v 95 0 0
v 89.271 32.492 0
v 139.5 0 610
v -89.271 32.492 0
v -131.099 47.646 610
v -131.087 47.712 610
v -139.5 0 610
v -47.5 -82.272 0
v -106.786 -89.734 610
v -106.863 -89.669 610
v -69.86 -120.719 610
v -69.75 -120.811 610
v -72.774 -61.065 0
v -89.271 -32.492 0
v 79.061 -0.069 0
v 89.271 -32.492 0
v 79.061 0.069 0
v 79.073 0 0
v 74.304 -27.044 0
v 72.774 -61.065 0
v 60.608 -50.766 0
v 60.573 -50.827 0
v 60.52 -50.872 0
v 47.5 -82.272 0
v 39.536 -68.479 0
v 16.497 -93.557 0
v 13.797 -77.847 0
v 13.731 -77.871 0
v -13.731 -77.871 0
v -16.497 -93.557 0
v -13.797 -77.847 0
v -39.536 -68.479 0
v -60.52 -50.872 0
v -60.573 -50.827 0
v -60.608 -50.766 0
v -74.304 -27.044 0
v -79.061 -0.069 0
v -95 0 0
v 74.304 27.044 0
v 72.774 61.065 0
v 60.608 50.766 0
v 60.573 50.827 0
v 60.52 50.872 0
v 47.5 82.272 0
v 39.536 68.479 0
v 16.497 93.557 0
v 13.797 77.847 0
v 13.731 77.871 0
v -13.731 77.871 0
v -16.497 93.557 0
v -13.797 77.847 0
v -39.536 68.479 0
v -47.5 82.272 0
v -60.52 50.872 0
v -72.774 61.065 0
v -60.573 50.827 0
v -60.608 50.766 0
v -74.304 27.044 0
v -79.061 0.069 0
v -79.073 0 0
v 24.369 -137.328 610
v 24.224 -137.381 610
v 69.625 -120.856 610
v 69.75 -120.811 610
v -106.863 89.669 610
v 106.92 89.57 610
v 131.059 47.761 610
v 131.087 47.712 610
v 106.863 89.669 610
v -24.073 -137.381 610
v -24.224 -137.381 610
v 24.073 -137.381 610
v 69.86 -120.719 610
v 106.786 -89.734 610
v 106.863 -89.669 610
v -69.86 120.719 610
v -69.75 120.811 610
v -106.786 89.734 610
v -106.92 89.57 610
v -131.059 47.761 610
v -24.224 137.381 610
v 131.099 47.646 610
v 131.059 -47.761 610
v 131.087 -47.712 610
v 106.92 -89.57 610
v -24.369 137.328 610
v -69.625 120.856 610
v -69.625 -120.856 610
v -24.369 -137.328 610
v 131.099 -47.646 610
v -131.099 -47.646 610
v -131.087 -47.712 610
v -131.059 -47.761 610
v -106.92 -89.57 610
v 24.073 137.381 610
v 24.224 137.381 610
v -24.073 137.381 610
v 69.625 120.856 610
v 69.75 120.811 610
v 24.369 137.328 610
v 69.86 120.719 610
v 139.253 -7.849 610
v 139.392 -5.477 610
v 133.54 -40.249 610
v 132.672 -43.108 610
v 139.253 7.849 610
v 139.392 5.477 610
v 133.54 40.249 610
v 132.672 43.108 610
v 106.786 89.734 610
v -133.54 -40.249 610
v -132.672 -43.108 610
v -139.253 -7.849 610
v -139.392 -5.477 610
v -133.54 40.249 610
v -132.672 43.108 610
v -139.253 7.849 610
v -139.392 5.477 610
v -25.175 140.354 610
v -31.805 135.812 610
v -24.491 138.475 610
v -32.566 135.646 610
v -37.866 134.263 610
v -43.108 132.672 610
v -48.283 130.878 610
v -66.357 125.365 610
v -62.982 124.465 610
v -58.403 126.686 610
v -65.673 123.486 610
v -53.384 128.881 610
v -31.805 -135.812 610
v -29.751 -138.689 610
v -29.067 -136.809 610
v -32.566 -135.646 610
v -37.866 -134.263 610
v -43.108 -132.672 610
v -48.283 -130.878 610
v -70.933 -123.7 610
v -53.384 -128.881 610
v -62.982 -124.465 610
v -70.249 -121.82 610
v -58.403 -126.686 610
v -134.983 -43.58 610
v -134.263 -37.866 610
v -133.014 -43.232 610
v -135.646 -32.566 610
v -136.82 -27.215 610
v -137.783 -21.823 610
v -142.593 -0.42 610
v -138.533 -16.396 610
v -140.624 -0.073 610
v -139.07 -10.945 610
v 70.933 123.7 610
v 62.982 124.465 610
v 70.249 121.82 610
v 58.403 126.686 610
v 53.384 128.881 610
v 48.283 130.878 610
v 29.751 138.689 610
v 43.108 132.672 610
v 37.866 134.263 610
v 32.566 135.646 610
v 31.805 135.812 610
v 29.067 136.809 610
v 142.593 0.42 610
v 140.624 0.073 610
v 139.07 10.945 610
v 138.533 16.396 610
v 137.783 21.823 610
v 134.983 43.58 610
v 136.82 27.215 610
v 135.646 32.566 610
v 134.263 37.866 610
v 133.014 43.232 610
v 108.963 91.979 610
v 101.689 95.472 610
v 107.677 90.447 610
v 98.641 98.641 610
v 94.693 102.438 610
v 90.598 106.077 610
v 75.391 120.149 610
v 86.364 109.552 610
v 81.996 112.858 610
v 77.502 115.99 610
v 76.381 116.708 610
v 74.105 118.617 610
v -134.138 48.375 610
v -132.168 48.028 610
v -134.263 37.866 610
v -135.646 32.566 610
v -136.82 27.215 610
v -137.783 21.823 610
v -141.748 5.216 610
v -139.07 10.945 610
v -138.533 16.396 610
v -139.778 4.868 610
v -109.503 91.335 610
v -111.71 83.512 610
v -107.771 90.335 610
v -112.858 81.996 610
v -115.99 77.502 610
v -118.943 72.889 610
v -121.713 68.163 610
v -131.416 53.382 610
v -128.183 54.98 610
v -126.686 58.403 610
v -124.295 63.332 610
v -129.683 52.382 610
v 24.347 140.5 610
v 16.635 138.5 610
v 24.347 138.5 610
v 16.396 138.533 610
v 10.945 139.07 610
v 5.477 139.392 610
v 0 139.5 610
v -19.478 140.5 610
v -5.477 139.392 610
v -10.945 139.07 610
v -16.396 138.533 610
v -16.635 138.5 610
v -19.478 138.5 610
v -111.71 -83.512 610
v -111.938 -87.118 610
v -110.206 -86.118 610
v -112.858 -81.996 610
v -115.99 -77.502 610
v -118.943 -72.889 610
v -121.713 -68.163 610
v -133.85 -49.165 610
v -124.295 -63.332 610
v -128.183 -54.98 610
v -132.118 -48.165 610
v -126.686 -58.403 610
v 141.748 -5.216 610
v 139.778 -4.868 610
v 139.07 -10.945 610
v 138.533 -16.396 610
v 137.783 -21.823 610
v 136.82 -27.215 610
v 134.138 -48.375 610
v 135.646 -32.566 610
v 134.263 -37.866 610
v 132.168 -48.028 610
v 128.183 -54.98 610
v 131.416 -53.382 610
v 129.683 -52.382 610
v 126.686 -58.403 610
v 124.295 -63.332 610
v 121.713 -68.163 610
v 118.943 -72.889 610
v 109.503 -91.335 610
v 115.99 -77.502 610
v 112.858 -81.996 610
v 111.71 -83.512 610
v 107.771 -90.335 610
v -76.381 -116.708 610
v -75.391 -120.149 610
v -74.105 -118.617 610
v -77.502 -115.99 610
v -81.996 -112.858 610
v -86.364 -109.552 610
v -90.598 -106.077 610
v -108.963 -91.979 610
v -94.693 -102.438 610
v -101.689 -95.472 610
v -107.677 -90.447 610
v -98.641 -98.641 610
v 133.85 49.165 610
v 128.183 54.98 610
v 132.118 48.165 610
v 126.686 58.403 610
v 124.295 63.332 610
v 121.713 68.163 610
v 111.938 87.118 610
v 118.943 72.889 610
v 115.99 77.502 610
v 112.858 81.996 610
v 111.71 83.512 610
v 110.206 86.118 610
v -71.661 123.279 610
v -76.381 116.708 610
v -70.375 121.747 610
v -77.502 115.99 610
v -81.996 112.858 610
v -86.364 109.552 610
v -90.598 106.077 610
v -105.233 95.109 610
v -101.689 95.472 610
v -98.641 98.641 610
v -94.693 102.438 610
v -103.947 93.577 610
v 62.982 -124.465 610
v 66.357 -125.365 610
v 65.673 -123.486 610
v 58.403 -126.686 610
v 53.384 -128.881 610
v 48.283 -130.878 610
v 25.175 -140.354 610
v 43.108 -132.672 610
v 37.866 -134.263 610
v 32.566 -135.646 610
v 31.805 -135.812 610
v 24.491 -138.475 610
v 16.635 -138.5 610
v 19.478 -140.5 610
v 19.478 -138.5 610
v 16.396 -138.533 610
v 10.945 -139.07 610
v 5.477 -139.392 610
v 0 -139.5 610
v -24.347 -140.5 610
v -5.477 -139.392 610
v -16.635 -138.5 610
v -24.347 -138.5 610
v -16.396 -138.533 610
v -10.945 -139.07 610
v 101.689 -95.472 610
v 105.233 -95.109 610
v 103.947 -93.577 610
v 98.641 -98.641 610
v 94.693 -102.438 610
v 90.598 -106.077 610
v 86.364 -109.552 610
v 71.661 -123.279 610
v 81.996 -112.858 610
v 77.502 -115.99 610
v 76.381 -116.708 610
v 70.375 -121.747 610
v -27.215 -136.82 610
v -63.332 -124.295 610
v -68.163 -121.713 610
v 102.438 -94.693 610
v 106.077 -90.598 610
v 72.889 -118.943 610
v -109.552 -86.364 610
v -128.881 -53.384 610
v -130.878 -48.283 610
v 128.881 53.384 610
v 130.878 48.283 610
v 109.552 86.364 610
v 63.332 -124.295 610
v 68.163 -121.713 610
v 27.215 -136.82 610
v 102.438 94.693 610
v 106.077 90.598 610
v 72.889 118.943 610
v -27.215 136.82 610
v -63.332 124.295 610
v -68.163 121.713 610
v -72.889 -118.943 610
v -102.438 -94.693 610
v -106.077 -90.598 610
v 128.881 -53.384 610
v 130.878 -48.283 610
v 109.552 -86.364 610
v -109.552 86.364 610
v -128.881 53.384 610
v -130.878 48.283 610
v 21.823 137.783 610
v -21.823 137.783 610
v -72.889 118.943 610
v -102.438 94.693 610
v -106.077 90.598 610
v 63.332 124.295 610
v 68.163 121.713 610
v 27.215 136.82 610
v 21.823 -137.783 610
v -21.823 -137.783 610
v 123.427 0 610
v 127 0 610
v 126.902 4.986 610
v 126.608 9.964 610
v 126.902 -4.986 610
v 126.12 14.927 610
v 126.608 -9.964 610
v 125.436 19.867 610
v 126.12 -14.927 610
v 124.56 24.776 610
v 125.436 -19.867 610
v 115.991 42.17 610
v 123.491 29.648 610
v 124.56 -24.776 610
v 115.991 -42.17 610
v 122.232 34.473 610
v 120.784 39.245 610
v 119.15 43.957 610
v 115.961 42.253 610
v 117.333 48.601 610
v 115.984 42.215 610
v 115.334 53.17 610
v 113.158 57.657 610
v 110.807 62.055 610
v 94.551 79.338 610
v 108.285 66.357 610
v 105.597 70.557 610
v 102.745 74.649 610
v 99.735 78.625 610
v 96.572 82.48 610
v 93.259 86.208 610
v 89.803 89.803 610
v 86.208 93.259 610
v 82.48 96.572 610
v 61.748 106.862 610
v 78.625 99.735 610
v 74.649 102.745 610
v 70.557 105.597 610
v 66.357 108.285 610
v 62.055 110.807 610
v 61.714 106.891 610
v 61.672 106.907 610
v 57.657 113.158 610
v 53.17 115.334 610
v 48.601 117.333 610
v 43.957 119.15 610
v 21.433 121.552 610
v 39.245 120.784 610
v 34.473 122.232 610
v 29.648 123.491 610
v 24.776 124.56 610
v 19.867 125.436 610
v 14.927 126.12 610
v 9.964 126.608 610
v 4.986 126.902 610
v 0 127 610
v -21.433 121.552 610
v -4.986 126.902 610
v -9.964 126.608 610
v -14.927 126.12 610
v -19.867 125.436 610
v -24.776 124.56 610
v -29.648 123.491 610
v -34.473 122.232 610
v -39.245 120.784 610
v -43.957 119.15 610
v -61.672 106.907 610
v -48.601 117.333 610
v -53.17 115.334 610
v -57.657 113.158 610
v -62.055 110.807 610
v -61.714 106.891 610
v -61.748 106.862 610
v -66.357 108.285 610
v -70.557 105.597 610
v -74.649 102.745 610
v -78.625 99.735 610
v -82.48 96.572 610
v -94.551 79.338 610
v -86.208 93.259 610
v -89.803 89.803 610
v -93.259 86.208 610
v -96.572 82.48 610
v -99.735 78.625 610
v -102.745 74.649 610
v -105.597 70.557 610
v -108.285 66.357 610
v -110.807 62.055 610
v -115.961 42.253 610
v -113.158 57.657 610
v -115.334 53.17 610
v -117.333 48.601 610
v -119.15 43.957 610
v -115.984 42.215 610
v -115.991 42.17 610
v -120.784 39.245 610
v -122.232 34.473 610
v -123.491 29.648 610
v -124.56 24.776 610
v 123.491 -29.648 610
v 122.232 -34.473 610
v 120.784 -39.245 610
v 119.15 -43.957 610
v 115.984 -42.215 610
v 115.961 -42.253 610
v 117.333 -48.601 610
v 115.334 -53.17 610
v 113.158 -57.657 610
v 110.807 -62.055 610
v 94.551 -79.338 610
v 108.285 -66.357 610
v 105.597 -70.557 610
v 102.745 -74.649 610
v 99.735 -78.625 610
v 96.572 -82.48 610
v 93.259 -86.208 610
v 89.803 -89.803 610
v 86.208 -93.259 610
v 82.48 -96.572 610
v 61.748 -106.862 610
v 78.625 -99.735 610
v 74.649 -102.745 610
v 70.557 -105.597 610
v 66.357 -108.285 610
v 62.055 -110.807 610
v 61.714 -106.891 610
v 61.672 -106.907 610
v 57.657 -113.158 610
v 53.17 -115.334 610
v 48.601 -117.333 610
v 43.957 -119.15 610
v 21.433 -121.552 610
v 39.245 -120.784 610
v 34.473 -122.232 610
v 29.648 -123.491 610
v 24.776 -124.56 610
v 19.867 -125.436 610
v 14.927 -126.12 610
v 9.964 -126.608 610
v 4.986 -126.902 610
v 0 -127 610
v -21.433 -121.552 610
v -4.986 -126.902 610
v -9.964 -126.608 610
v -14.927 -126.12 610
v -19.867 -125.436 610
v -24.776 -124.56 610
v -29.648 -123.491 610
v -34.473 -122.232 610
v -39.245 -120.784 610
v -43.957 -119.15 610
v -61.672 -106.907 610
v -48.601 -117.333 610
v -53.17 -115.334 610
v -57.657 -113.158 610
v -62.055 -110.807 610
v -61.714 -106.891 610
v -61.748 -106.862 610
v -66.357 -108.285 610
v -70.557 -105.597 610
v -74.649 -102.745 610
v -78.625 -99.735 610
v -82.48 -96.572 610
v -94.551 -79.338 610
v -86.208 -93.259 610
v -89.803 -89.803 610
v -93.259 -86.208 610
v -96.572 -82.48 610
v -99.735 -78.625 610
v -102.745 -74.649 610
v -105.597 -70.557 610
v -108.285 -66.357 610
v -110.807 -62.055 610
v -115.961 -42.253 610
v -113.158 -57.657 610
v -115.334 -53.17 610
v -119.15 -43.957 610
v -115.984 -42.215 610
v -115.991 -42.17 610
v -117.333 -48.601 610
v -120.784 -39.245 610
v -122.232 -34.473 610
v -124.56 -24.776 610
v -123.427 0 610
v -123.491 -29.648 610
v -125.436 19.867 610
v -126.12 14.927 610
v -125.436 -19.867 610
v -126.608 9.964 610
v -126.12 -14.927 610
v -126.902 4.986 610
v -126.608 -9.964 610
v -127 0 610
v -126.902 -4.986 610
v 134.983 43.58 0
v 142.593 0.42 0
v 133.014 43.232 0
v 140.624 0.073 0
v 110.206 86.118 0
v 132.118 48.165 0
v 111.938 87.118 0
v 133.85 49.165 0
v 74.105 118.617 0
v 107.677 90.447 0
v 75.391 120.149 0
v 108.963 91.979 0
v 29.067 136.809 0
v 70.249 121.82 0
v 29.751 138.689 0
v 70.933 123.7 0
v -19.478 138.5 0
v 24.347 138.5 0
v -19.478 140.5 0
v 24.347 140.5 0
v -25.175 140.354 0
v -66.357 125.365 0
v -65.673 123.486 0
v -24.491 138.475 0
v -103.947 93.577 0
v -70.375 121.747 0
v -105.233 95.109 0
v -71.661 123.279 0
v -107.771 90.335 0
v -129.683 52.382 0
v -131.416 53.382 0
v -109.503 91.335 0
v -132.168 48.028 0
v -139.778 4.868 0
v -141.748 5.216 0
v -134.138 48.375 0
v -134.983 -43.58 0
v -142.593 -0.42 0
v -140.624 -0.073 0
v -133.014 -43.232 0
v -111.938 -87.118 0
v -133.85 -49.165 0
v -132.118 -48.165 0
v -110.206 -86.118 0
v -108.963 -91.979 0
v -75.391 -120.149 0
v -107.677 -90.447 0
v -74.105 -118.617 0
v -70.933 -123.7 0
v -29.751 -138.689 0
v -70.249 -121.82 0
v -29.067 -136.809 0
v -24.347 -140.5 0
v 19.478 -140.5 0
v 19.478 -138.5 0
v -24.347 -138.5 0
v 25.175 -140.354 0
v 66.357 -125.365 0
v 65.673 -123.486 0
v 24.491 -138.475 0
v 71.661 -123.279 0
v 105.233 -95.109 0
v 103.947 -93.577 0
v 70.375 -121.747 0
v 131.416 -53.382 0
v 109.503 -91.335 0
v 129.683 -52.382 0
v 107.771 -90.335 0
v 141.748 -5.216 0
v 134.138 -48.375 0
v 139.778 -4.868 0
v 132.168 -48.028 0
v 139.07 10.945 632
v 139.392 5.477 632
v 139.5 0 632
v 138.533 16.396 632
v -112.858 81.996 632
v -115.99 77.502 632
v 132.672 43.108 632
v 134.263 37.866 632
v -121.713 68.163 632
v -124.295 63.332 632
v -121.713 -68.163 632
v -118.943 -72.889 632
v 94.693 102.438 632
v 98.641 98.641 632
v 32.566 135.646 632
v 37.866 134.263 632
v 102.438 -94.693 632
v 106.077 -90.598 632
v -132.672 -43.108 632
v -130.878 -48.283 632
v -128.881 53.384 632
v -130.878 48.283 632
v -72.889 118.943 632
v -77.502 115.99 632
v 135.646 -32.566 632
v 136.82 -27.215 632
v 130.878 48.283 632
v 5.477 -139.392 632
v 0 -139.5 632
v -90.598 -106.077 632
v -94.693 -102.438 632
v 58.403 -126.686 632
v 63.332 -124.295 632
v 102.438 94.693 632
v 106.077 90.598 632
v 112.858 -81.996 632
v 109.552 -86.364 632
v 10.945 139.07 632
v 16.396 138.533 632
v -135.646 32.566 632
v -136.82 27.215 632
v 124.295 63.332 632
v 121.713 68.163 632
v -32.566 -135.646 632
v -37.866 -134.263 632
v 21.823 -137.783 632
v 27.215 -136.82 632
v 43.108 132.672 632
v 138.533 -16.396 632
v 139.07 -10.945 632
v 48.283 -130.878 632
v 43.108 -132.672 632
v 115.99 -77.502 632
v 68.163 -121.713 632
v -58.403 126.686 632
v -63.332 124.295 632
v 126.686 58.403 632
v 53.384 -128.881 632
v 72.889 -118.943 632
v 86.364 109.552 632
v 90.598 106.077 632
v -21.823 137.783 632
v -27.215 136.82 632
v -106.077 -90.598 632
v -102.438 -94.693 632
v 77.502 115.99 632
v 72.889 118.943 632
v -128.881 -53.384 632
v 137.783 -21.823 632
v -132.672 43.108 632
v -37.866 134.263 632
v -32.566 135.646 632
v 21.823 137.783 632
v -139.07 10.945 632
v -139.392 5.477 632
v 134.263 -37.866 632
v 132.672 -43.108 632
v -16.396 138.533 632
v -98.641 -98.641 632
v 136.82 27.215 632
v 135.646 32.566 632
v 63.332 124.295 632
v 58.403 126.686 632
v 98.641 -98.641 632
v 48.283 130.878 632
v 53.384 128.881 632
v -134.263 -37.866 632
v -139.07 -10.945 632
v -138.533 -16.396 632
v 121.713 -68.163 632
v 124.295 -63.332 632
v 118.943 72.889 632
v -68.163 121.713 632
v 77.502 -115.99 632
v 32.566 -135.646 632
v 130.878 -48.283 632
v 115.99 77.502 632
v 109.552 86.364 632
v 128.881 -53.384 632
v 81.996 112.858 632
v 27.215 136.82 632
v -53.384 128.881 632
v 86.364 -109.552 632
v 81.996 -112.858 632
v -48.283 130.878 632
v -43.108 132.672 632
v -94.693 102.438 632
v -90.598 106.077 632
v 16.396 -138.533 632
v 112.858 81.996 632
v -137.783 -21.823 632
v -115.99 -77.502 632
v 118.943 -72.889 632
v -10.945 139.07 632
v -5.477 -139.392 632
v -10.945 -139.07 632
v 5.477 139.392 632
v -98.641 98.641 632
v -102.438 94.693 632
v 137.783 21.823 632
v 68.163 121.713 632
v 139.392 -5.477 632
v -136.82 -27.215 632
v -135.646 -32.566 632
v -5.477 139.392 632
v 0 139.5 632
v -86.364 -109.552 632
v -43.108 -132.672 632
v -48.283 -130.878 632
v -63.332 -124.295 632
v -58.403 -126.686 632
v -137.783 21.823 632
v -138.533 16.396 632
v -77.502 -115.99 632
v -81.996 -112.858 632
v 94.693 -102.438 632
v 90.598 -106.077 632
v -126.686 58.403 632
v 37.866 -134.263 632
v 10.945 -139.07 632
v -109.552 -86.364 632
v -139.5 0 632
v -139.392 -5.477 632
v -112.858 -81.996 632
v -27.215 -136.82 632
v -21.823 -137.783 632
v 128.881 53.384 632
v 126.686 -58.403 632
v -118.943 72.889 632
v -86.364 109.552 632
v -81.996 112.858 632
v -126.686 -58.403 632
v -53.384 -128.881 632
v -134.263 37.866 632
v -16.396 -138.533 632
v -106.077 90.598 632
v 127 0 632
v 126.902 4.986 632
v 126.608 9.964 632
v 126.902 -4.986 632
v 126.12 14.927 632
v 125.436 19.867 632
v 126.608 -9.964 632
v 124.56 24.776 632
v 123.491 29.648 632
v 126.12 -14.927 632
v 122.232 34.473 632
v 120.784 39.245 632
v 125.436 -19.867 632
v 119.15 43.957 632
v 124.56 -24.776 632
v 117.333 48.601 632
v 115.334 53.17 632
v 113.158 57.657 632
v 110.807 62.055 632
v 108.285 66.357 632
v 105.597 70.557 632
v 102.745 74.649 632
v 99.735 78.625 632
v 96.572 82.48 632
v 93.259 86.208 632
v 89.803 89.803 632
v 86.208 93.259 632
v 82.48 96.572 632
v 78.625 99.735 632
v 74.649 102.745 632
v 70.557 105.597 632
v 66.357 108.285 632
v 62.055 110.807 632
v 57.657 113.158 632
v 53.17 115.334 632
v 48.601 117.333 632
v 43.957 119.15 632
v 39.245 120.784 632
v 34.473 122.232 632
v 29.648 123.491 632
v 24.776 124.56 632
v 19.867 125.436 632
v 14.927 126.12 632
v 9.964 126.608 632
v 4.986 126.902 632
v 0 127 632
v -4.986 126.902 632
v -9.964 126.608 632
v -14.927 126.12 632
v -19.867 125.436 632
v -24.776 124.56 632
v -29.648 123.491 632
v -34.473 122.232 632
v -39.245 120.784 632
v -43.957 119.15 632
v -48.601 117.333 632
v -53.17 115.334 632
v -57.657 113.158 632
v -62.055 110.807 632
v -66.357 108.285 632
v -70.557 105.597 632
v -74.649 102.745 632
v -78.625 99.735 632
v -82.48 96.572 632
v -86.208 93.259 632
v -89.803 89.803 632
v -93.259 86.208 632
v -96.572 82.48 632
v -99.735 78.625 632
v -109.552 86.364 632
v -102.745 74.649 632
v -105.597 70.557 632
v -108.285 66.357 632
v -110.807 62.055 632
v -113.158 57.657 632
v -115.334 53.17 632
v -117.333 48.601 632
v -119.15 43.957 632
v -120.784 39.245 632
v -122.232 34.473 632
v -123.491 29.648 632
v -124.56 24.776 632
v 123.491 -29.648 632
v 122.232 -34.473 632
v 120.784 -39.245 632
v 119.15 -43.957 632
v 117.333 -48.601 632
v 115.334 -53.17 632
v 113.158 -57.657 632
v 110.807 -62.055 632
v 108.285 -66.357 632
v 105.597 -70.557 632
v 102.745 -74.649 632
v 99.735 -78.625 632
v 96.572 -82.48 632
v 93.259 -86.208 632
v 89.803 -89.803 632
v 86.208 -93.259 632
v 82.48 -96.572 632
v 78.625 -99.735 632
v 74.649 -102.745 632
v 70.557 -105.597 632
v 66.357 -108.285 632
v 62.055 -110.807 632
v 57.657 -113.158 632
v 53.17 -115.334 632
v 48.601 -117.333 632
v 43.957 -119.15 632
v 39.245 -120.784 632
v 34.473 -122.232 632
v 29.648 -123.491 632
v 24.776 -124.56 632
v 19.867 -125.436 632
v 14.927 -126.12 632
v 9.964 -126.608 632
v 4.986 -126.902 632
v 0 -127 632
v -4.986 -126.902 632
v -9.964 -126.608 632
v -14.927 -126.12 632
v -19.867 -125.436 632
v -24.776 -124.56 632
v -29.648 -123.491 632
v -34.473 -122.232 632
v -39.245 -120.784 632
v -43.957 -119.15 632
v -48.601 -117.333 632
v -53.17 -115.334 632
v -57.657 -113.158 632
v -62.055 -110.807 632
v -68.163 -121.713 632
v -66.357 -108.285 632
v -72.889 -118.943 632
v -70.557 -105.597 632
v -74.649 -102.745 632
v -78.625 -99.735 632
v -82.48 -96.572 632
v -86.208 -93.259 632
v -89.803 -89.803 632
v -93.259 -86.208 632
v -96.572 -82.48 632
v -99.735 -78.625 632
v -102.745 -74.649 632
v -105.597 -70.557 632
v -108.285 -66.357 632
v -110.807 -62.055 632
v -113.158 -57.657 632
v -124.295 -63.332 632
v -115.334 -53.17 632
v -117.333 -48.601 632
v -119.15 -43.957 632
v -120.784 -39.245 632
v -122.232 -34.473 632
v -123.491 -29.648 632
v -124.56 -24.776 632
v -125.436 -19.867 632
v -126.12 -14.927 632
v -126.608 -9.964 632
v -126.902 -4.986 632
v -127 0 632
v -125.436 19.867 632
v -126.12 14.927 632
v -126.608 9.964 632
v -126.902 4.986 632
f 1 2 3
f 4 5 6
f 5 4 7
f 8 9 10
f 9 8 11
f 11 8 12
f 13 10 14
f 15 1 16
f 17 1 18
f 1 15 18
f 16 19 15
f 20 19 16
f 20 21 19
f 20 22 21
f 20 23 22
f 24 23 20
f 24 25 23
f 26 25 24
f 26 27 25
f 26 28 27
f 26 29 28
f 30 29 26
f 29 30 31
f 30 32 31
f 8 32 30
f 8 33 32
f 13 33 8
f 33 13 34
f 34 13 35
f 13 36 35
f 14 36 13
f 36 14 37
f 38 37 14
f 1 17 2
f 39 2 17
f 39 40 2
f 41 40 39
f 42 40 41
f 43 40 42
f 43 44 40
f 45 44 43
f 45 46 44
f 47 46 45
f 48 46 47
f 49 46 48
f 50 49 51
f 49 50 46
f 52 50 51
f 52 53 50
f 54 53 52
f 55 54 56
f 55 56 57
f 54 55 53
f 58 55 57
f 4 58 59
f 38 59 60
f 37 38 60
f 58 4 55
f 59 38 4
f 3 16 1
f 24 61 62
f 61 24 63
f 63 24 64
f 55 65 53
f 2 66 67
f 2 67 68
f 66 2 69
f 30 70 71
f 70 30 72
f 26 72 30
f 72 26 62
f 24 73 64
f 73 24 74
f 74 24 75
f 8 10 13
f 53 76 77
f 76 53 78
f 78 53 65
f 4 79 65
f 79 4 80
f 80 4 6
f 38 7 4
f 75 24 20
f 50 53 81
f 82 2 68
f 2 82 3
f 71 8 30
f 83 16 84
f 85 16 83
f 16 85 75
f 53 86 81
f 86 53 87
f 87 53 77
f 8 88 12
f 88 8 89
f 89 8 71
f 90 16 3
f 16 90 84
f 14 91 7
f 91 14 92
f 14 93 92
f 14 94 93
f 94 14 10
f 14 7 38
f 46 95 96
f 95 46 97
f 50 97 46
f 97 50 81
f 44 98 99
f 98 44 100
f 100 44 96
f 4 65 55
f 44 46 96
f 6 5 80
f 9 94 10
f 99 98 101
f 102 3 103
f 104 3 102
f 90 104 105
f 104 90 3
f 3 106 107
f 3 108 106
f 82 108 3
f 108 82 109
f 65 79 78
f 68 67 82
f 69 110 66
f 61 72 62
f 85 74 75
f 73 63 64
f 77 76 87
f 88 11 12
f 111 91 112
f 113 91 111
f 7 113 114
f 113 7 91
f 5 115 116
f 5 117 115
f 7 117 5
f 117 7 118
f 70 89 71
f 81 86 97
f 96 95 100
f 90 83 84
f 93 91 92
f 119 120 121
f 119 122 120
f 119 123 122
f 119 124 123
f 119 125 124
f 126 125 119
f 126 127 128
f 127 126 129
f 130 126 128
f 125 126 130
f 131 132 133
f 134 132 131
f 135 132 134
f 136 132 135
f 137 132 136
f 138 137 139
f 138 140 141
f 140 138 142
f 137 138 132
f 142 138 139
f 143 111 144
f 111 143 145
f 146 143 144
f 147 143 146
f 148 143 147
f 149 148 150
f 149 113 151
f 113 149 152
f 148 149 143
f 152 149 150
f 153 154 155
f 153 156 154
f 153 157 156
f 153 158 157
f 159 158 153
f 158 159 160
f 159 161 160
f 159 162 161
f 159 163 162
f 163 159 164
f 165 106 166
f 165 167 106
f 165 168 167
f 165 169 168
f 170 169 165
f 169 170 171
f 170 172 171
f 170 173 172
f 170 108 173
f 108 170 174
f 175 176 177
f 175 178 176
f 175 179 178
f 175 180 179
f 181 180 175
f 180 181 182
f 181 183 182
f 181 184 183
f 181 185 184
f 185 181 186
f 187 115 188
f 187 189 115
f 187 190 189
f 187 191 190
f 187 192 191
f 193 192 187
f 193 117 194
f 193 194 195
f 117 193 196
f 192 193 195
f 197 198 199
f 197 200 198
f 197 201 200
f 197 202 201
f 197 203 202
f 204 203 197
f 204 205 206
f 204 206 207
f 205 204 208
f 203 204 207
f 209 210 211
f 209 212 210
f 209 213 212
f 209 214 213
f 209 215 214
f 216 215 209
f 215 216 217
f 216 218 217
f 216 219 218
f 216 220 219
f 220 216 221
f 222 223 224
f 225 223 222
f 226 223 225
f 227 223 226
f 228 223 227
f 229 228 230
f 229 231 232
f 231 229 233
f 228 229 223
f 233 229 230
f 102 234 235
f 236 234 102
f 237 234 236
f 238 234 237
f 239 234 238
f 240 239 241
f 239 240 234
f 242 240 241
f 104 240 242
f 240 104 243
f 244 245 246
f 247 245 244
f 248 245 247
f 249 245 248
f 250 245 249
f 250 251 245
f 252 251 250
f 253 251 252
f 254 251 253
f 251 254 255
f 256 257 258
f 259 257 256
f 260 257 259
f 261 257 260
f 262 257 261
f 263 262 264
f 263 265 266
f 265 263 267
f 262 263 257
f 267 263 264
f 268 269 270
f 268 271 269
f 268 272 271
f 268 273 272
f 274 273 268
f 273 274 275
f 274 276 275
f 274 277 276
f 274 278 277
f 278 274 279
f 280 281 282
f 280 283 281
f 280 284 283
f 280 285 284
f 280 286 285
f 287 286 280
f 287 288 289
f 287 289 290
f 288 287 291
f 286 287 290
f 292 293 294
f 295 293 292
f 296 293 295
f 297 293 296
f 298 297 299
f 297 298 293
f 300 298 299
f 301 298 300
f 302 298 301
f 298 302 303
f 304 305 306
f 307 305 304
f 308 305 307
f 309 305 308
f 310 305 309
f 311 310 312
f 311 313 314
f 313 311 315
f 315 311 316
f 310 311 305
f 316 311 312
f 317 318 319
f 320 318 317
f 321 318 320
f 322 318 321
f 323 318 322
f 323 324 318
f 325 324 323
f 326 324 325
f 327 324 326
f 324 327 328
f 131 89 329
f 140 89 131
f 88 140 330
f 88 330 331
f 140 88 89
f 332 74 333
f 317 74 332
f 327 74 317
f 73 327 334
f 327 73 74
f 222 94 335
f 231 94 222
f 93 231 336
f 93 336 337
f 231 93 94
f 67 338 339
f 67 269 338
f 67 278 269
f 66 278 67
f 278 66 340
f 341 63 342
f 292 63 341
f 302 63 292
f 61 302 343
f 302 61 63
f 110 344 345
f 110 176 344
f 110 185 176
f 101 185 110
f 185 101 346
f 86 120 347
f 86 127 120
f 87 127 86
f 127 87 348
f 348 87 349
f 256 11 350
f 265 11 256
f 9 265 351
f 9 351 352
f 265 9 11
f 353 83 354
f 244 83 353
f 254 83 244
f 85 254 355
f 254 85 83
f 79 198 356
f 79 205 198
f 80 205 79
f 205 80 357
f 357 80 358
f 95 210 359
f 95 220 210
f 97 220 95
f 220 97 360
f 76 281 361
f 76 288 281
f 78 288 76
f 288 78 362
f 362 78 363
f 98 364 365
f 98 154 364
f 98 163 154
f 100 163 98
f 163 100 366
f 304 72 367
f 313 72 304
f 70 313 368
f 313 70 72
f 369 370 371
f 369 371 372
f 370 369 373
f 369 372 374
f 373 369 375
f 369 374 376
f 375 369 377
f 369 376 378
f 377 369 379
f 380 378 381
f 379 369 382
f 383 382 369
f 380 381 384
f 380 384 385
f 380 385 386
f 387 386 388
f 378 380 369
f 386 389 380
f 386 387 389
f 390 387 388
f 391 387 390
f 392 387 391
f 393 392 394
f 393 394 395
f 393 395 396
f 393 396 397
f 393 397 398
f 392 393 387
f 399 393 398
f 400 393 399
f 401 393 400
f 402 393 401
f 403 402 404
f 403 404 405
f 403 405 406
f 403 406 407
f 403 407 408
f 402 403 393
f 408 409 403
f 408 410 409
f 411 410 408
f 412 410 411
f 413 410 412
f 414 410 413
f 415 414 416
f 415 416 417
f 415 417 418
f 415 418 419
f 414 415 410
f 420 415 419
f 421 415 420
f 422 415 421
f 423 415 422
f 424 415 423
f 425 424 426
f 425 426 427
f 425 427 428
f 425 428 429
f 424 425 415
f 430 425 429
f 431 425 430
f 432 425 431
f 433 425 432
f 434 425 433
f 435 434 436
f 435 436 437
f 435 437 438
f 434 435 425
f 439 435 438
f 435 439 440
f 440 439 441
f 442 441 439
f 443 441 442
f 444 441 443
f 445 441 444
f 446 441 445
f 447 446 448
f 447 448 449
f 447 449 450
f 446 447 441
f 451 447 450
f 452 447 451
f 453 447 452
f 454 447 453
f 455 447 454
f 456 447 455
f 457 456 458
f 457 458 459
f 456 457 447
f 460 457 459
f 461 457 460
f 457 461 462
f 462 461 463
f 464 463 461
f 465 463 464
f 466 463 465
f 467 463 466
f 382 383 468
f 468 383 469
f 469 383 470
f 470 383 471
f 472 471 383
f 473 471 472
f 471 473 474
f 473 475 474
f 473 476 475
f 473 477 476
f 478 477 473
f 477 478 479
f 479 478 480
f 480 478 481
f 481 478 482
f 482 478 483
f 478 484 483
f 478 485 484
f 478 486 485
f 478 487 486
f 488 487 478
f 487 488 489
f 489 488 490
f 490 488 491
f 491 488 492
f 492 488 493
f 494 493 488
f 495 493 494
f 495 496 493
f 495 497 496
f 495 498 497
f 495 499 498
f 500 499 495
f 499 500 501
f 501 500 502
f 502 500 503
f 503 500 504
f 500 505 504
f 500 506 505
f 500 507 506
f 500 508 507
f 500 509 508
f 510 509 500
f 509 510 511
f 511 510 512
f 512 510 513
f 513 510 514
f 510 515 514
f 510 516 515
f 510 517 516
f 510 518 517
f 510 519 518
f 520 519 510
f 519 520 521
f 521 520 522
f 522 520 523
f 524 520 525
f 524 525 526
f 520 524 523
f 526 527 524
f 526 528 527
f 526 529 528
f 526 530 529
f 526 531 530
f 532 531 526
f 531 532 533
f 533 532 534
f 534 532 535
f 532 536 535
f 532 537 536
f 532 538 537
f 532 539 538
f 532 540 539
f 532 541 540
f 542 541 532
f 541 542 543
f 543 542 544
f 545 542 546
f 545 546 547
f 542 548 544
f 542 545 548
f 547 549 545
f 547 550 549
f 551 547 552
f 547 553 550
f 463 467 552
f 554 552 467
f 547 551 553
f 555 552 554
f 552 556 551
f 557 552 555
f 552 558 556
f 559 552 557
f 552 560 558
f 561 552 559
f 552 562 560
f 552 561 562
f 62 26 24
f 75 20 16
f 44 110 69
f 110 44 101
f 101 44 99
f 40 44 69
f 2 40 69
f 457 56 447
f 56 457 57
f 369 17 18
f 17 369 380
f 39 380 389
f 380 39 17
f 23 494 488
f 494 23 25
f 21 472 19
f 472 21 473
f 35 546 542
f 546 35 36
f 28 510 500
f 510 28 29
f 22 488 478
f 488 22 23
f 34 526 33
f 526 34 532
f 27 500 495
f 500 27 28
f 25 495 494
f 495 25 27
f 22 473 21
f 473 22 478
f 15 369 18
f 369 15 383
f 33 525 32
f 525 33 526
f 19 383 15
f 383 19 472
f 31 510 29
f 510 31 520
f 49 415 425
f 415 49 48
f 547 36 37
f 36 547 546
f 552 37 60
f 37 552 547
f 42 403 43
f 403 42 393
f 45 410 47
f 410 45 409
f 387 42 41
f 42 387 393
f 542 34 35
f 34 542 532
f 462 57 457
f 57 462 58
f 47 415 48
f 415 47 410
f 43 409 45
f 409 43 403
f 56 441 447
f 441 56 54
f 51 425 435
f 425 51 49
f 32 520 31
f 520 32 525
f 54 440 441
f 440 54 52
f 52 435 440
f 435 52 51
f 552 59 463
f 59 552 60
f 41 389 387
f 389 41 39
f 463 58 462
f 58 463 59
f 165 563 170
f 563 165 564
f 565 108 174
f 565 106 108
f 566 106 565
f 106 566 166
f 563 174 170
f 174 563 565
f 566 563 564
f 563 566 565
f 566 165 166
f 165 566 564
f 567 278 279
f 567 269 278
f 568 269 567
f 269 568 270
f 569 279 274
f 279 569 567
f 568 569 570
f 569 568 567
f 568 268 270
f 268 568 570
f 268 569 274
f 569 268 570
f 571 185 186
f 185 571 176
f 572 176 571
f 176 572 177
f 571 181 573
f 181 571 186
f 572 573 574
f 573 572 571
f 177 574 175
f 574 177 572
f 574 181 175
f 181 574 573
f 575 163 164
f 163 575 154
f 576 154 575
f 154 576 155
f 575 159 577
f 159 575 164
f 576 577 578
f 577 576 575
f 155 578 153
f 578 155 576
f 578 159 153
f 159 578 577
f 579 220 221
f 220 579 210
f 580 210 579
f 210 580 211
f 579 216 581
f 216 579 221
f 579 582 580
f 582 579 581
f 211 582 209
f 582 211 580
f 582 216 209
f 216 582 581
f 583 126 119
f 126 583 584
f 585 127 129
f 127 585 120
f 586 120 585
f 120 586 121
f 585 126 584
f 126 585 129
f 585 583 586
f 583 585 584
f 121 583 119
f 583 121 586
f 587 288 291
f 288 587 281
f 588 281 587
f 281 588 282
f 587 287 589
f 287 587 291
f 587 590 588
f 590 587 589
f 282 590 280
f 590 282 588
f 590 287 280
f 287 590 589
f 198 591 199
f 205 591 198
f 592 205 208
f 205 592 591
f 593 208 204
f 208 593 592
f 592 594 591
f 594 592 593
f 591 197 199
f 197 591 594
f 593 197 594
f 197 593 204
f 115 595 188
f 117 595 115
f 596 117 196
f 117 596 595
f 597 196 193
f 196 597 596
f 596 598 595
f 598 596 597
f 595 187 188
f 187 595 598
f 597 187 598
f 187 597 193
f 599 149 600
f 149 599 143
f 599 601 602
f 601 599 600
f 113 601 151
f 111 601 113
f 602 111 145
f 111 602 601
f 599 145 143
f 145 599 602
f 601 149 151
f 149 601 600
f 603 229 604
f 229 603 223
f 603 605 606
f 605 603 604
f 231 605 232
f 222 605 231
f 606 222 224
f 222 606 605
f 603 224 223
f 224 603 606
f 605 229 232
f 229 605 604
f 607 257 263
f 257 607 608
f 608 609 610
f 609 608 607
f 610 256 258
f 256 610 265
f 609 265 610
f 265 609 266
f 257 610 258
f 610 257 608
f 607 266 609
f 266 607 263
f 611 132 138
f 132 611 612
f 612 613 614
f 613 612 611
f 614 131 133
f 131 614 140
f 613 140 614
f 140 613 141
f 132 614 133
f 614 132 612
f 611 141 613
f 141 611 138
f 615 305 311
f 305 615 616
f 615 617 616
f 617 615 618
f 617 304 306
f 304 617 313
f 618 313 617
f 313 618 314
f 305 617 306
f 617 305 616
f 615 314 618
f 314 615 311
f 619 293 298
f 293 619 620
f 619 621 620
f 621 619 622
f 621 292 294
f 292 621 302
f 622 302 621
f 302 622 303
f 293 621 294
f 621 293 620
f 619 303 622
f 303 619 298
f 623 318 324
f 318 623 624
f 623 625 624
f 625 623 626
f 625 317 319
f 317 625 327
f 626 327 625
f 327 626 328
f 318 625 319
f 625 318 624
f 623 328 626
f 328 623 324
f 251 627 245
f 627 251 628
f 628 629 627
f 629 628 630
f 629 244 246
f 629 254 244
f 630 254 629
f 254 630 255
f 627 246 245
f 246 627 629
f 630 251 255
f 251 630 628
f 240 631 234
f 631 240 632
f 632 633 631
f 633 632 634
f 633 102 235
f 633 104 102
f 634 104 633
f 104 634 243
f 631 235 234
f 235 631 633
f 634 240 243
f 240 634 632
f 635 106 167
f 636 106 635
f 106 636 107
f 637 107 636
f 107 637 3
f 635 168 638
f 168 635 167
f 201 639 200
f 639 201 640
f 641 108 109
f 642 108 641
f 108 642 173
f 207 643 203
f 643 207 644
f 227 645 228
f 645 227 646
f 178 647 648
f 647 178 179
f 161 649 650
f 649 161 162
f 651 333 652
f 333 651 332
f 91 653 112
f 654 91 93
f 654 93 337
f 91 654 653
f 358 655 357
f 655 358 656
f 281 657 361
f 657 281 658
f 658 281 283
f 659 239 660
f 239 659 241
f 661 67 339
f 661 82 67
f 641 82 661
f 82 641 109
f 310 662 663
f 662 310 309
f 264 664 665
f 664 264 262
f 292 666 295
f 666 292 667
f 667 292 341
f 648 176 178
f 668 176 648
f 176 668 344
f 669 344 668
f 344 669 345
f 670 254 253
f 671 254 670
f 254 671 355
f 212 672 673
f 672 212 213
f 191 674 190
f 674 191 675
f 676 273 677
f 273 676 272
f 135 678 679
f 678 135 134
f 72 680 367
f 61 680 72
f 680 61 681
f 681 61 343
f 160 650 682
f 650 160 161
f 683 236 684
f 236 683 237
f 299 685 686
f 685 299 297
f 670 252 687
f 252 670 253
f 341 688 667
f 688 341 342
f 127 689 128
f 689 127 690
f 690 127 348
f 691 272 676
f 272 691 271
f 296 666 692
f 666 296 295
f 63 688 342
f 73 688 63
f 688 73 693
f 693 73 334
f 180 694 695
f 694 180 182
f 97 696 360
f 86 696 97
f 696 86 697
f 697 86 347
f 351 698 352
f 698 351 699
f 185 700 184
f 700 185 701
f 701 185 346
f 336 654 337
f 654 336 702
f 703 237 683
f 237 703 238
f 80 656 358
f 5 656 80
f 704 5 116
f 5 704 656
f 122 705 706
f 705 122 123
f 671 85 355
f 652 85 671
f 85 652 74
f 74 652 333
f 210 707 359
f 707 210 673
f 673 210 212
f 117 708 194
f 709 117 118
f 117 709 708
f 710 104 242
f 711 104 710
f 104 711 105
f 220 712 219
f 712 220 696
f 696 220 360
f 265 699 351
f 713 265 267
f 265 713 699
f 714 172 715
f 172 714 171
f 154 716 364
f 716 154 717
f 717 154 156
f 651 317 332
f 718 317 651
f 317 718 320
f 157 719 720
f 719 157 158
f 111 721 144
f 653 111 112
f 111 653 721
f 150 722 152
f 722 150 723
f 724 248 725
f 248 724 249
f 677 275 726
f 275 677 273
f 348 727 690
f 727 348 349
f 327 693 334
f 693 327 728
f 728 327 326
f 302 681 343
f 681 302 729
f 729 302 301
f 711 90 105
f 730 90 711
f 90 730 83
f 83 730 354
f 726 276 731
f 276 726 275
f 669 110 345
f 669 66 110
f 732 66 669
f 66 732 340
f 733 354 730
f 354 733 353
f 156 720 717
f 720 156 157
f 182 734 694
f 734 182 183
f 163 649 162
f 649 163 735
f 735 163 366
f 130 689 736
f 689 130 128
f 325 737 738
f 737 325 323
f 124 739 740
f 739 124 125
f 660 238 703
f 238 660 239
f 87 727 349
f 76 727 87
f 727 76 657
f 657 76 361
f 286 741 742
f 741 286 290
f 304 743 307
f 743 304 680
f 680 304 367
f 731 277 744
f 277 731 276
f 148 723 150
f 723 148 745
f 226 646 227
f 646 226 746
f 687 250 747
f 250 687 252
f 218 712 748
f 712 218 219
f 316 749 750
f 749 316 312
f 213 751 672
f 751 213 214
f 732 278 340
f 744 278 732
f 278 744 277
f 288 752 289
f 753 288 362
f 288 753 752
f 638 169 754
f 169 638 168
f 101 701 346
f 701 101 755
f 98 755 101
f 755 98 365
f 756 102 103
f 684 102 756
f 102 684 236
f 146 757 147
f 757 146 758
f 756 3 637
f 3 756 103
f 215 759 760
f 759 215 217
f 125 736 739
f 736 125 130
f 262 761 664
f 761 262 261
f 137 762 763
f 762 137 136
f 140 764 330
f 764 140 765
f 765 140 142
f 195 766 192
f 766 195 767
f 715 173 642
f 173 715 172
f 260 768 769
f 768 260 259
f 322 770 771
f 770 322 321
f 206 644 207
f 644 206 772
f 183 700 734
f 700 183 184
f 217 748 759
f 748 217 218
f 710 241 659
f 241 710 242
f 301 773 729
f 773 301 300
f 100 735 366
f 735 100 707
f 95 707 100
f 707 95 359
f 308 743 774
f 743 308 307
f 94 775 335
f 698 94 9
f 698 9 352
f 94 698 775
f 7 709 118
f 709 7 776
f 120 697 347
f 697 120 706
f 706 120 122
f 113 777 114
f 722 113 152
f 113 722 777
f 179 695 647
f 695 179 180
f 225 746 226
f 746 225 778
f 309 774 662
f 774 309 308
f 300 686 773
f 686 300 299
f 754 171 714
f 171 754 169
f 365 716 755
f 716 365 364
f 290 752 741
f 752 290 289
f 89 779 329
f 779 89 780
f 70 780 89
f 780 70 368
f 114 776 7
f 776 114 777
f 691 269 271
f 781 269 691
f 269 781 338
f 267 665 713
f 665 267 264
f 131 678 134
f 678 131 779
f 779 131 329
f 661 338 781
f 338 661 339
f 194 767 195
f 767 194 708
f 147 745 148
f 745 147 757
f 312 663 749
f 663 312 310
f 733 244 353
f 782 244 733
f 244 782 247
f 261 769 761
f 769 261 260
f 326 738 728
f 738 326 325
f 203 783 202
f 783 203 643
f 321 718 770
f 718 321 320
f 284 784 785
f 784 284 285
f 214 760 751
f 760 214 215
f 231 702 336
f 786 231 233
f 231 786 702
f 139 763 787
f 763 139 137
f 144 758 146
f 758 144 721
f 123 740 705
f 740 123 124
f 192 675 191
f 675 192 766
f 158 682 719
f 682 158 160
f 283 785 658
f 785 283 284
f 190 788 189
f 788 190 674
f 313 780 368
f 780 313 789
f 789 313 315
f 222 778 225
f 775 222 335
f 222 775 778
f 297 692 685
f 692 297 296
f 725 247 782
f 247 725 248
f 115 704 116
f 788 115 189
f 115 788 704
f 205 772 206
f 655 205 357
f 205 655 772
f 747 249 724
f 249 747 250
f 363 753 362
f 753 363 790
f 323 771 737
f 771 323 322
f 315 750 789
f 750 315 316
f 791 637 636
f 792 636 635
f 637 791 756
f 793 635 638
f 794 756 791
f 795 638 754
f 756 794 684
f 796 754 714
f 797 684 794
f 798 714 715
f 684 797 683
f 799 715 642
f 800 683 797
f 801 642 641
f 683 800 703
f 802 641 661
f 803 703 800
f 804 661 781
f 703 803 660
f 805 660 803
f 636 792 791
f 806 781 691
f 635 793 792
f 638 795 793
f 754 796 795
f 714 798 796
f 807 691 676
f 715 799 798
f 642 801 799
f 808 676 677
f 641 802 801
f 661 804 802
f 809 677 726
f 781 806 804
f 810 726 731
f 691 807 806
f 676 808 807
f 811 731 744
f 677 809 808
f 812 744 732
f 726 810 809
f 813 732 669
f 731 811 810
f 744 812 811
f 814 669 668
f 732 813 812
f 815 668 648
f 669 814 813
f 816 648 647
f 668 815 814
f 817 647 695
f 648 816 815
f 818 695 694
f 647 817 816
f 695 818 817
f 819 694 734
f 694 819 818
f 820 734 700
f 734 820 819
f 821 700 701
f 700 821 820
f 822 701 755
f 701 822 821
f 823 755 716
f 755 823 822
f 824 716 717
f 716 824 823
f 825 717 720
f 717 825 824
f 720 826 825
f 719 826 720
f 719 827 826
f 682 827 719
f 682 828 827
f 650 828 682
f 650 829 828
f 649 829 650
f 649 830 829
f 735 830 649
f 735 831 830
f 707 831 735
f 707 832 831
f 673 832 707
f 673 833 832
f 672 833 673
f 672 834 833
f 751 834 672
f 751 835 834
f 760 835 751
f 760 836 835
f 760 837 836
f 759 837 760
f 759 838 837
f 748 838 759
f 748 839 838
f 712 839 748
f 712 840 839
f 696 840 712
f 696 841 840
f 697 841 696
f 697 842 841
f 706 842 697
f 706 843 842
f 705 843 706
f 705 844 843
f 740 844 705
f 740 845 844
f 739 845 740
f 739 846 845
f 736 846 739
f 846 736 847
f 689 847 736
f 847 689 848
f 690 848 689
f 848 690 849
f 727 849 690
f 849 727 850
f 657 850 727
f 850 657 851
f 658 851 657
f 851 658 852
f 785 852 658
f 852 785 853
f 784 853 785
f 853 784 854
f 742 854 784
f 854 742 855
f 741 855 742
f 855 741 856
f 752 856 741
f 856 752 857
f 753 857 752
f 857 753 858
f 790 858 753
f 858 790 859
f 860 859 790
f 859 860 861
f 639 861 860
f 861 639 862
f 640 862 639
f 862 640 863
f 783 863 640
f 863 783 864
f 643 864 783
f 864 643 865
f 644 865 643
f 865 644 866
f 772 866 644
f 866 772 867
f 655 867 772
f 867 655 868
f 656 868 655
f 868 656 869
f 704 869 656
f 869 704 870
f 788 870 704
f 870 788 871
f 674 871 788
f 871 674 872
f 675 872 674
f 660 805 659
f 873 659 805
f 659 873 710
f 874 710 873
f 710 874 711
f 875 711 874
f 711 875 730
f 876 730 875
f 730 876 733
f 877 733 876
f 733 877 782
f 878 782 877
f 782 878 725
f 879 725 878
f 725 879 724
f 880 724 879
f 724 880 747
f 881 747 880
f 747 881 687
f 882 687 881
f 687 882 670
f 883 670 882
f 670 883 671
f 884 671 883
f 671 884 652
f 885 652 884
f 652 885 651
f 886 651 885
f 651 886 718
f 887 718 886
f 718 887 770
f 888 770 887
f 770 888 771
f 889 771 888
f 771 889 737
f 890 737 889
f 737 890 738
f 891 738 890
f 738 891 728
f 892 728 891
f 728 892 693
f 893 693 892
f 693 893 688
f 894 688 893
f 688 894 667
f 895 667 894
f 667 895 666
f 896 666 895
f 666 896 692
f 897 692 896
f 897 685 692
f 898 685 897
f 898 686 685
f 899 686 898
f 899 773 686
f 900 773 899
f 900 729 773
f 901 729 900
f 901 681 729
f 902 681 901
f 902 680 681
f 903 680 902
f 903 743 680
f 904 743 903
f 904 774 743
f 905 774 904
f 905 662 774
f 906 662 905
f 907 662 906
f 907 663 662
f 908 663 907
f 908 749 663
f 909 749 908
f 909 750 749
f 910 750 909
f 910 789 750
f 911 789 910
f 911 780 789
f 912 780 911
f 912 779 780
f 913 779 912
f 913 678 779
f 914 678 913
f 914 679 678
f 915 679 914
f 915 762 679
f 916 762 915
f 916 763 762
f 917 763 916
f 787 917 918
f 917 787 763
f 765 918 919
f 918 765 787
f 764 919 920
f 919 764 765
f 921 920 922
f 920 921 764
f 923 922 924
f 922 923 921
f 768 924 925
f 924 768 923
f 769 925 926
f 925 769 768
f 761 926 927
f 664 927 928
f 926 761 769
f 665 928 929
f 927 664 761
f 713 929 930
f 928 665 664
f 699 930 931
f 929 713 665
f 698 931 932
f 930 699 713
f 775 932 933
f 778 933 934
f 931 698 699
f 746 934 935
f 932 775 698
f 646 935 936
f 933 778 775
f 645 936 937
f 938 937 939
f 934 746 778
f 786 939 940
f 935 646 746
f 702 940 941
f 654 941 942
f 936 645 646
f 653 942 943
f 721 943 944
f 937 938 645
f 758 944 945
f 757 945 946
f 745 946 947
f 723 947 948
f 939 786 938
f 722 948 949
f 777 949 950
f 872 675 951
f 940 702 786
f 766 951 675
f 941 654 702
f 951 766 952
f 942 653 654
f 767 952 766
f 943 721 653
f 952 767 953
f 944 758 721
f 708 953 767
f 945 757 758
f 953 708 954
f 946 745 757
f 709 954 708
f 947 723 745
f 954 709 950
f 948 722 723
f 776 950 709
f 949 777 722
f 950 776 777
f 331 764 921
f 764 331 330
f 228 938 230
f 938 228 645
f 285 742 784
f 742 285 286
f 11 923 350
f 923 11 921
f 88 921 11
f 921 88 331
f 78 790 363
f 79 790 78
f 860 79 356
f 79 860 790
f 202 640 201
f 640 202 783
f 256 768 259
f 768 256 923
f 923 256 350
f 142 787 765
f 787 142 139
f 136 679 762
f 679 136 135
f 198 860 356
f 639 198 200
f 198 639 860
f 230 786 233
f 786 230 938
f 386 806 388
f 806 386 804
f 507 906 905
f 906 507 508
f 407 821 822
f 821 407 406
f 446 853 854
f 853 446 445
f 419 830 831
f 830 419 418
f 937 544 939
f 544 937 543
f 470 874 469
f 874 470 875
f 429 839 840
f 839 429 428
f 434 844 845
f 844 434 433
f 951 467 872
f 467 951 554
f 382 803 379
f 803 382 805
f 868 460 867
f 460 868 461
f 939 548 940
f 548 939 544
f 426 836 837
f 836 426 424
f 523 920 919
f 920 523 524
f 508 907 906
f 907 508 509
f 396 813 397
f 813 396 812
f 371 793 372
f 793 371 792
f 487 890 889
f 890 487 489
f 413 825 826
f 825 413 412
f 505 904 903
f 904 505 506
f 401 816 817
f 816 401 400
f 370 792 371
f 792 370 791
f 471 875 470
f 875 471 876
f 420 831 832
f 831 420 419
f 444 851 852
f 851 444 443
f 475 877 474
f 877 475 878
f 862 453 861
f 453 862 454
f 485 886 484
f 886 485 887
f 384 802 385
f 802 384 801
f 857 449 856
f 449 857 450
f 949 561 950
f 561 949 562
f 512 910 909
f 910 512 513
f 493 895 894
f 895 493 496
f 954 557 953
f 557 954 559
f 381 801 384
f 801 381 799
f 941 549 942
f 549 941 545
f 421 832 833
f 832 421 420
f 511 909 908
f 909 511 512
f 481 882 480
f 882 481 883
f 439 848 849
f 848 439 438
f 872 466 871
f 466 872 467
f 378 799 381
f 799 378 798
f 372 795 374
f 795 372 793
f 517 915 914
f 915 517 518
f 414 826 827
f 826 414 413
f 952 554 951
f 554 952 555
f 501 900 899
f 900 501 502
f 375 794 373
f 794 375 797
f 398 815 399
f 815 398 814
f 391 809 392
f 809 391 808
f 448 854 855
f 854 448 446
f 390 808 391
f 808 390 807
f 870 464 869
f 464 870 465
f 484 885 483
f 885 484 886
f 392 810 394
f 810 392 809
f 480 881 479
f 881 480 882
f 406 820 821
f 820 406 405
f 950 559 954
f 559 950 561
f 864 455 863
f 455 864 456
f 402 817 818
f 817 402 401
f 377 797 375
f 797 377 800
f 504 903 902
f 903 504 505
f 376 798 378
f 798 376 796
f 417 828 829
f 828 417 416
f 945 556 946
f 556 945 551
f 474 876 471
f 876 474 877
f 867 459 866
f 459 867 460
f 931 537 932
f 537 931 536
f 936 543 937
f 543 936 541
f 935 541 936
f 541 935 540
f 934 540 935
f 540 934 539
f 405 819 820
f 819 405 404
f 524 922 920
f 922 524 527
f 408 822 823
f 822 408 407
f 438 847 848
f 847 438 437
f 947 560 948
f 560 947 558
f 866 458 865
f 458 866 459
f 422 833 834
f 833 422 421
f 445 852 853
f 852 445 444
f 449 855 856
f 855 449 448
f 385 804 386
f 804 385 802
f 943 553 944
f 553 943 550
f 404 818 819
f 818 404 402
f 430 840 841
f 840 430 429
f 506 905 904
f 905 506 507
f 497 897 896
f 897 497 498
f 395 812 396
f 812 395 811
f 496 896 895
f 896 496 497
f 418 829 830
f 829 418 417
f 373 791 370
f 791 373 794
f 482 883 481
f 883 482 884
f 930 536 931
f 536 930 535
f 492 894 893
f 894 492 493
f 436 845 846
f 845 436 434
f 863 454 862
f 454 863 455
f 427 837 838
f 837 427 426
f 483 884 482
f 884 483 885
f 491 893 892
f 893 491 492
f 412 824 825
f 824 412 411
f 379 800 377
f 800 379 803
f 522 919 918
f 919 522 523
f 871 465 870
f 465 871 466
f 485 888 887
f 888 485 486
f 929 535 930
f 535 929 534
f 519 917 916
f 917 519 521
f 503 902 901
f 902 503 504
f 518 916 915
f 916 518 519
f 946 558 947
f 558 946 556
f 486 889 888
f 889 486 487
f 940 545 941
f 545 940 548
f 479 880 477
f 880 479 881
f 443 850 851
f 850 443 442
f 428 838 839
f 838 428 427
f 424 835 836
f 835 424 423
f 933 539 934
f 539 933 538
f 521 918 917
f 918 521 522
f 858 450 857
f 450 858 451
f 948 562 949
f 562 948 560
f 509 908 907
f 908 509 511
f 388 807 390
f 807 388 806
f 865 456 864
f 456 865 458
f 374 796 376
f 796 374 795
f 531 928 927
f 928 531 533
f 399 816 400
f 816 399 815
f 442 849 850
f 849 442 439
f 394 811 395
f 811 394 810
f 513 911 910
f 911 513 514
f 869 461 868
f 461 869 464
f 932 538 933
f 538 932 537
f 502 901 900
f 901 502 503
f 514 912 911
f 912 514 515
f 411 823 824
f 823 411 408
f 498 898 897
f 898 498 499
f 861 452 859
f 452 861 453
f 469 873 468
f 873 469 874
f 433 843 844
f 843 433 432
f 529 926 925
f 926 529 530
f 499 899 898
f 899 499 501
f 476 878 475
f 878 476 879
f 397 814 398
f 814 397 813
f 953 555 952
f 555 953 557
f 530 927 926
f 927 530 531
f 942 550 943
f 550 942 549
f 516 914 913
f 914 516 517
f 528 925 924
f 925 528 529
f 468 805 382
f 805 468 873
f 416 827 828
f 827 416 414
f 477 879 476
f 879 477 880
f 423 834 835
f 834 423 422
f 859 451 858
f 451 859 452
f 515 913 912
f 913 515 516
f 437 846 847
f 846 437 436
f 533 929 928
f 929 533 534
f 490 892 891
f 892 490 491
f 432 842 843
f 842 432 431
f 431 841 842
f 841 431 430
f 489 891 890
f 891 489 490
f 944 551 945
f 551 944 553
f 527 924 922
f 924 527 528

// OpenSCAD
// ashiko-drum-workshop.scad — parametric stave-shell envelope master
// =====================================================================
// SOURCE OF TRUTH: build/packet/design.md "Target geometry" table
//   + CAD/drum-body/Ashiko-REV012316.SLDPRT (SolidWorks dimensional authority).
// AUTHORITY: pending_measurement. This is an HONEST ENVELOPE SCAFFOLD, NOT
//   fabrication authority until reviewed against the SolidWorks masters and
//   the 2015 workshop drawings.
//
// SCOPE / BOUNDARY (per V5 percussion addendum):
//   - Models the staved truncated-cone SHELL ENVELOPE + head ring + stave-count
//     facets parametrically, so the overall geometry traces to the design table.
//   - The TUNING-SENSITIVE compound-miter stave cut (miter + bevel derived from
//     taper half-angle, the bearing-edge lathe profile, and the rope-mali lug
//     field) are HAND-REFINED regions and are intentionally OUT OF SCOPE here;
//     they live in the SolidWorks parts and drawings/Stave-Cutting-Process.pdf.
//   - foot_od is an ASSUMPTION (not in the design table) — see comment below.
//
// Render check: openscad -o /tmp/ashiko-drum-workshop-check.stl this-file  (exit 0)
// =====================================================================

/* [Shell — from design.md Target geometry, Standard variant] */
stave_count      = 18;     // design.md: "Stave count 18" (Workshop drawings)
head_od_mm       = 279;    // design.md: Shell OD at head 279 mm (11 in), Standard
shell_height_mm  = 610;    // design.md: Shell height 610 mm (24 in)
stave_bevel_deg  = 10;     // design.md: 10 deg per face (20 deg included), n=18
head_dia_mm      = 254;    // design.md: Head diameter (soaked, mounted) 254 mm (10 in)
wall_mm          = 16;     // ASSUMPTION: nominal stave wall ~16 mm (0.63 in);
                           //   not tabulated — pending measurement of SLDPRT.

/* [Taper — ASSUMPTION, not in design.md] */
// The ashiko is a truncated cone narrowing toward the foot. The design table
// gives ONLY the head OD; the foot OD is not tabulated. Modeled as a parameter,
// clearly marked assumption, so the envelope is honest and reviewable.
foot_od_mm       = 190;    // ASSUMPTION (~0.68 x head OD). PENDING MEASUREMENT.

/* [Maple variant — design.md] */
// head_od_mm = 292; head_dia_mm = 267;  // 11.5 in shell / 10.5 in head

/* [Render] */
$fn = 160;
explode = 0;               // set >0 to lift the head ring for an exploded view

// Derived (formulas, not baked values) ------------------------------
stave_face_width_mm = PI * head_od_mm / stave_count;  // design.md "Computed: pi*D/n"
head_r  = head_od_mm / 2;
foot_r  = foot_od_mm / 2;

// Staved shell as a faceted truncated cone (n = stave_count facets) -------
module shell_outer() {
    cylinder(h = shell_height_mm, r1 = foot_r, r2 = head_r, $fn = stave_count);
}
module shell() {
    difference() {
        shell_outer();
        // inner cavity offset by nominal wall thickness
        translate([0, 0, -1])
            cylinder(h = shell_height_mm + 2,
                     r1 = foot_r - wall_mm, r2 = head_r - wall_mm,
                     $fn = stave_count);
    }
}

// Head bearing ring (goatskin mounts flush to shell OD) ------------------
head_ring_h = 22;  // ASSUMPTION: bearing-edge band height; pending measurement
module head_ring() {
    difference() {
        cylinder(h = head_ring_h, r = head_r);
        translate([0, 0, -1]) cylinder(h = head_ring_h + 2, r = head_dia_mm / 2);
    }
}

// One representative stave face (illustrative, NOT the miter-cut solid) ---
module stave_marker() {
    // thin vertical rib on the outer face to visualize stave_count / width
    a = 360 / stave_count;
    rotate([0, 0, a/2])
        translate([head_r - 1, -stave_face_width_mm/2, 0])
            cube([2, stave_face_width_mm * 0.9, shell_height_mm]);
}

// Assembly --------------------------------------------------------------
module ashiko_assembly() {
    color("Peru") shell();
    for (i = [0 : stave_count - 1])
        rotate([0, 0, i * 360 / stave_count]) color("SaddleBrown") stave_marker();
    translate([0, 0, shell_height_mm + explode * 40])
        color("Tan") head_ring();
}

ashiko_assembly();

// echo derived values for review
echo(str("stave_face_width_mm = ", stave_face_width_mm, " (pi*", head_od_mm, "/", stave_count, ")"));
